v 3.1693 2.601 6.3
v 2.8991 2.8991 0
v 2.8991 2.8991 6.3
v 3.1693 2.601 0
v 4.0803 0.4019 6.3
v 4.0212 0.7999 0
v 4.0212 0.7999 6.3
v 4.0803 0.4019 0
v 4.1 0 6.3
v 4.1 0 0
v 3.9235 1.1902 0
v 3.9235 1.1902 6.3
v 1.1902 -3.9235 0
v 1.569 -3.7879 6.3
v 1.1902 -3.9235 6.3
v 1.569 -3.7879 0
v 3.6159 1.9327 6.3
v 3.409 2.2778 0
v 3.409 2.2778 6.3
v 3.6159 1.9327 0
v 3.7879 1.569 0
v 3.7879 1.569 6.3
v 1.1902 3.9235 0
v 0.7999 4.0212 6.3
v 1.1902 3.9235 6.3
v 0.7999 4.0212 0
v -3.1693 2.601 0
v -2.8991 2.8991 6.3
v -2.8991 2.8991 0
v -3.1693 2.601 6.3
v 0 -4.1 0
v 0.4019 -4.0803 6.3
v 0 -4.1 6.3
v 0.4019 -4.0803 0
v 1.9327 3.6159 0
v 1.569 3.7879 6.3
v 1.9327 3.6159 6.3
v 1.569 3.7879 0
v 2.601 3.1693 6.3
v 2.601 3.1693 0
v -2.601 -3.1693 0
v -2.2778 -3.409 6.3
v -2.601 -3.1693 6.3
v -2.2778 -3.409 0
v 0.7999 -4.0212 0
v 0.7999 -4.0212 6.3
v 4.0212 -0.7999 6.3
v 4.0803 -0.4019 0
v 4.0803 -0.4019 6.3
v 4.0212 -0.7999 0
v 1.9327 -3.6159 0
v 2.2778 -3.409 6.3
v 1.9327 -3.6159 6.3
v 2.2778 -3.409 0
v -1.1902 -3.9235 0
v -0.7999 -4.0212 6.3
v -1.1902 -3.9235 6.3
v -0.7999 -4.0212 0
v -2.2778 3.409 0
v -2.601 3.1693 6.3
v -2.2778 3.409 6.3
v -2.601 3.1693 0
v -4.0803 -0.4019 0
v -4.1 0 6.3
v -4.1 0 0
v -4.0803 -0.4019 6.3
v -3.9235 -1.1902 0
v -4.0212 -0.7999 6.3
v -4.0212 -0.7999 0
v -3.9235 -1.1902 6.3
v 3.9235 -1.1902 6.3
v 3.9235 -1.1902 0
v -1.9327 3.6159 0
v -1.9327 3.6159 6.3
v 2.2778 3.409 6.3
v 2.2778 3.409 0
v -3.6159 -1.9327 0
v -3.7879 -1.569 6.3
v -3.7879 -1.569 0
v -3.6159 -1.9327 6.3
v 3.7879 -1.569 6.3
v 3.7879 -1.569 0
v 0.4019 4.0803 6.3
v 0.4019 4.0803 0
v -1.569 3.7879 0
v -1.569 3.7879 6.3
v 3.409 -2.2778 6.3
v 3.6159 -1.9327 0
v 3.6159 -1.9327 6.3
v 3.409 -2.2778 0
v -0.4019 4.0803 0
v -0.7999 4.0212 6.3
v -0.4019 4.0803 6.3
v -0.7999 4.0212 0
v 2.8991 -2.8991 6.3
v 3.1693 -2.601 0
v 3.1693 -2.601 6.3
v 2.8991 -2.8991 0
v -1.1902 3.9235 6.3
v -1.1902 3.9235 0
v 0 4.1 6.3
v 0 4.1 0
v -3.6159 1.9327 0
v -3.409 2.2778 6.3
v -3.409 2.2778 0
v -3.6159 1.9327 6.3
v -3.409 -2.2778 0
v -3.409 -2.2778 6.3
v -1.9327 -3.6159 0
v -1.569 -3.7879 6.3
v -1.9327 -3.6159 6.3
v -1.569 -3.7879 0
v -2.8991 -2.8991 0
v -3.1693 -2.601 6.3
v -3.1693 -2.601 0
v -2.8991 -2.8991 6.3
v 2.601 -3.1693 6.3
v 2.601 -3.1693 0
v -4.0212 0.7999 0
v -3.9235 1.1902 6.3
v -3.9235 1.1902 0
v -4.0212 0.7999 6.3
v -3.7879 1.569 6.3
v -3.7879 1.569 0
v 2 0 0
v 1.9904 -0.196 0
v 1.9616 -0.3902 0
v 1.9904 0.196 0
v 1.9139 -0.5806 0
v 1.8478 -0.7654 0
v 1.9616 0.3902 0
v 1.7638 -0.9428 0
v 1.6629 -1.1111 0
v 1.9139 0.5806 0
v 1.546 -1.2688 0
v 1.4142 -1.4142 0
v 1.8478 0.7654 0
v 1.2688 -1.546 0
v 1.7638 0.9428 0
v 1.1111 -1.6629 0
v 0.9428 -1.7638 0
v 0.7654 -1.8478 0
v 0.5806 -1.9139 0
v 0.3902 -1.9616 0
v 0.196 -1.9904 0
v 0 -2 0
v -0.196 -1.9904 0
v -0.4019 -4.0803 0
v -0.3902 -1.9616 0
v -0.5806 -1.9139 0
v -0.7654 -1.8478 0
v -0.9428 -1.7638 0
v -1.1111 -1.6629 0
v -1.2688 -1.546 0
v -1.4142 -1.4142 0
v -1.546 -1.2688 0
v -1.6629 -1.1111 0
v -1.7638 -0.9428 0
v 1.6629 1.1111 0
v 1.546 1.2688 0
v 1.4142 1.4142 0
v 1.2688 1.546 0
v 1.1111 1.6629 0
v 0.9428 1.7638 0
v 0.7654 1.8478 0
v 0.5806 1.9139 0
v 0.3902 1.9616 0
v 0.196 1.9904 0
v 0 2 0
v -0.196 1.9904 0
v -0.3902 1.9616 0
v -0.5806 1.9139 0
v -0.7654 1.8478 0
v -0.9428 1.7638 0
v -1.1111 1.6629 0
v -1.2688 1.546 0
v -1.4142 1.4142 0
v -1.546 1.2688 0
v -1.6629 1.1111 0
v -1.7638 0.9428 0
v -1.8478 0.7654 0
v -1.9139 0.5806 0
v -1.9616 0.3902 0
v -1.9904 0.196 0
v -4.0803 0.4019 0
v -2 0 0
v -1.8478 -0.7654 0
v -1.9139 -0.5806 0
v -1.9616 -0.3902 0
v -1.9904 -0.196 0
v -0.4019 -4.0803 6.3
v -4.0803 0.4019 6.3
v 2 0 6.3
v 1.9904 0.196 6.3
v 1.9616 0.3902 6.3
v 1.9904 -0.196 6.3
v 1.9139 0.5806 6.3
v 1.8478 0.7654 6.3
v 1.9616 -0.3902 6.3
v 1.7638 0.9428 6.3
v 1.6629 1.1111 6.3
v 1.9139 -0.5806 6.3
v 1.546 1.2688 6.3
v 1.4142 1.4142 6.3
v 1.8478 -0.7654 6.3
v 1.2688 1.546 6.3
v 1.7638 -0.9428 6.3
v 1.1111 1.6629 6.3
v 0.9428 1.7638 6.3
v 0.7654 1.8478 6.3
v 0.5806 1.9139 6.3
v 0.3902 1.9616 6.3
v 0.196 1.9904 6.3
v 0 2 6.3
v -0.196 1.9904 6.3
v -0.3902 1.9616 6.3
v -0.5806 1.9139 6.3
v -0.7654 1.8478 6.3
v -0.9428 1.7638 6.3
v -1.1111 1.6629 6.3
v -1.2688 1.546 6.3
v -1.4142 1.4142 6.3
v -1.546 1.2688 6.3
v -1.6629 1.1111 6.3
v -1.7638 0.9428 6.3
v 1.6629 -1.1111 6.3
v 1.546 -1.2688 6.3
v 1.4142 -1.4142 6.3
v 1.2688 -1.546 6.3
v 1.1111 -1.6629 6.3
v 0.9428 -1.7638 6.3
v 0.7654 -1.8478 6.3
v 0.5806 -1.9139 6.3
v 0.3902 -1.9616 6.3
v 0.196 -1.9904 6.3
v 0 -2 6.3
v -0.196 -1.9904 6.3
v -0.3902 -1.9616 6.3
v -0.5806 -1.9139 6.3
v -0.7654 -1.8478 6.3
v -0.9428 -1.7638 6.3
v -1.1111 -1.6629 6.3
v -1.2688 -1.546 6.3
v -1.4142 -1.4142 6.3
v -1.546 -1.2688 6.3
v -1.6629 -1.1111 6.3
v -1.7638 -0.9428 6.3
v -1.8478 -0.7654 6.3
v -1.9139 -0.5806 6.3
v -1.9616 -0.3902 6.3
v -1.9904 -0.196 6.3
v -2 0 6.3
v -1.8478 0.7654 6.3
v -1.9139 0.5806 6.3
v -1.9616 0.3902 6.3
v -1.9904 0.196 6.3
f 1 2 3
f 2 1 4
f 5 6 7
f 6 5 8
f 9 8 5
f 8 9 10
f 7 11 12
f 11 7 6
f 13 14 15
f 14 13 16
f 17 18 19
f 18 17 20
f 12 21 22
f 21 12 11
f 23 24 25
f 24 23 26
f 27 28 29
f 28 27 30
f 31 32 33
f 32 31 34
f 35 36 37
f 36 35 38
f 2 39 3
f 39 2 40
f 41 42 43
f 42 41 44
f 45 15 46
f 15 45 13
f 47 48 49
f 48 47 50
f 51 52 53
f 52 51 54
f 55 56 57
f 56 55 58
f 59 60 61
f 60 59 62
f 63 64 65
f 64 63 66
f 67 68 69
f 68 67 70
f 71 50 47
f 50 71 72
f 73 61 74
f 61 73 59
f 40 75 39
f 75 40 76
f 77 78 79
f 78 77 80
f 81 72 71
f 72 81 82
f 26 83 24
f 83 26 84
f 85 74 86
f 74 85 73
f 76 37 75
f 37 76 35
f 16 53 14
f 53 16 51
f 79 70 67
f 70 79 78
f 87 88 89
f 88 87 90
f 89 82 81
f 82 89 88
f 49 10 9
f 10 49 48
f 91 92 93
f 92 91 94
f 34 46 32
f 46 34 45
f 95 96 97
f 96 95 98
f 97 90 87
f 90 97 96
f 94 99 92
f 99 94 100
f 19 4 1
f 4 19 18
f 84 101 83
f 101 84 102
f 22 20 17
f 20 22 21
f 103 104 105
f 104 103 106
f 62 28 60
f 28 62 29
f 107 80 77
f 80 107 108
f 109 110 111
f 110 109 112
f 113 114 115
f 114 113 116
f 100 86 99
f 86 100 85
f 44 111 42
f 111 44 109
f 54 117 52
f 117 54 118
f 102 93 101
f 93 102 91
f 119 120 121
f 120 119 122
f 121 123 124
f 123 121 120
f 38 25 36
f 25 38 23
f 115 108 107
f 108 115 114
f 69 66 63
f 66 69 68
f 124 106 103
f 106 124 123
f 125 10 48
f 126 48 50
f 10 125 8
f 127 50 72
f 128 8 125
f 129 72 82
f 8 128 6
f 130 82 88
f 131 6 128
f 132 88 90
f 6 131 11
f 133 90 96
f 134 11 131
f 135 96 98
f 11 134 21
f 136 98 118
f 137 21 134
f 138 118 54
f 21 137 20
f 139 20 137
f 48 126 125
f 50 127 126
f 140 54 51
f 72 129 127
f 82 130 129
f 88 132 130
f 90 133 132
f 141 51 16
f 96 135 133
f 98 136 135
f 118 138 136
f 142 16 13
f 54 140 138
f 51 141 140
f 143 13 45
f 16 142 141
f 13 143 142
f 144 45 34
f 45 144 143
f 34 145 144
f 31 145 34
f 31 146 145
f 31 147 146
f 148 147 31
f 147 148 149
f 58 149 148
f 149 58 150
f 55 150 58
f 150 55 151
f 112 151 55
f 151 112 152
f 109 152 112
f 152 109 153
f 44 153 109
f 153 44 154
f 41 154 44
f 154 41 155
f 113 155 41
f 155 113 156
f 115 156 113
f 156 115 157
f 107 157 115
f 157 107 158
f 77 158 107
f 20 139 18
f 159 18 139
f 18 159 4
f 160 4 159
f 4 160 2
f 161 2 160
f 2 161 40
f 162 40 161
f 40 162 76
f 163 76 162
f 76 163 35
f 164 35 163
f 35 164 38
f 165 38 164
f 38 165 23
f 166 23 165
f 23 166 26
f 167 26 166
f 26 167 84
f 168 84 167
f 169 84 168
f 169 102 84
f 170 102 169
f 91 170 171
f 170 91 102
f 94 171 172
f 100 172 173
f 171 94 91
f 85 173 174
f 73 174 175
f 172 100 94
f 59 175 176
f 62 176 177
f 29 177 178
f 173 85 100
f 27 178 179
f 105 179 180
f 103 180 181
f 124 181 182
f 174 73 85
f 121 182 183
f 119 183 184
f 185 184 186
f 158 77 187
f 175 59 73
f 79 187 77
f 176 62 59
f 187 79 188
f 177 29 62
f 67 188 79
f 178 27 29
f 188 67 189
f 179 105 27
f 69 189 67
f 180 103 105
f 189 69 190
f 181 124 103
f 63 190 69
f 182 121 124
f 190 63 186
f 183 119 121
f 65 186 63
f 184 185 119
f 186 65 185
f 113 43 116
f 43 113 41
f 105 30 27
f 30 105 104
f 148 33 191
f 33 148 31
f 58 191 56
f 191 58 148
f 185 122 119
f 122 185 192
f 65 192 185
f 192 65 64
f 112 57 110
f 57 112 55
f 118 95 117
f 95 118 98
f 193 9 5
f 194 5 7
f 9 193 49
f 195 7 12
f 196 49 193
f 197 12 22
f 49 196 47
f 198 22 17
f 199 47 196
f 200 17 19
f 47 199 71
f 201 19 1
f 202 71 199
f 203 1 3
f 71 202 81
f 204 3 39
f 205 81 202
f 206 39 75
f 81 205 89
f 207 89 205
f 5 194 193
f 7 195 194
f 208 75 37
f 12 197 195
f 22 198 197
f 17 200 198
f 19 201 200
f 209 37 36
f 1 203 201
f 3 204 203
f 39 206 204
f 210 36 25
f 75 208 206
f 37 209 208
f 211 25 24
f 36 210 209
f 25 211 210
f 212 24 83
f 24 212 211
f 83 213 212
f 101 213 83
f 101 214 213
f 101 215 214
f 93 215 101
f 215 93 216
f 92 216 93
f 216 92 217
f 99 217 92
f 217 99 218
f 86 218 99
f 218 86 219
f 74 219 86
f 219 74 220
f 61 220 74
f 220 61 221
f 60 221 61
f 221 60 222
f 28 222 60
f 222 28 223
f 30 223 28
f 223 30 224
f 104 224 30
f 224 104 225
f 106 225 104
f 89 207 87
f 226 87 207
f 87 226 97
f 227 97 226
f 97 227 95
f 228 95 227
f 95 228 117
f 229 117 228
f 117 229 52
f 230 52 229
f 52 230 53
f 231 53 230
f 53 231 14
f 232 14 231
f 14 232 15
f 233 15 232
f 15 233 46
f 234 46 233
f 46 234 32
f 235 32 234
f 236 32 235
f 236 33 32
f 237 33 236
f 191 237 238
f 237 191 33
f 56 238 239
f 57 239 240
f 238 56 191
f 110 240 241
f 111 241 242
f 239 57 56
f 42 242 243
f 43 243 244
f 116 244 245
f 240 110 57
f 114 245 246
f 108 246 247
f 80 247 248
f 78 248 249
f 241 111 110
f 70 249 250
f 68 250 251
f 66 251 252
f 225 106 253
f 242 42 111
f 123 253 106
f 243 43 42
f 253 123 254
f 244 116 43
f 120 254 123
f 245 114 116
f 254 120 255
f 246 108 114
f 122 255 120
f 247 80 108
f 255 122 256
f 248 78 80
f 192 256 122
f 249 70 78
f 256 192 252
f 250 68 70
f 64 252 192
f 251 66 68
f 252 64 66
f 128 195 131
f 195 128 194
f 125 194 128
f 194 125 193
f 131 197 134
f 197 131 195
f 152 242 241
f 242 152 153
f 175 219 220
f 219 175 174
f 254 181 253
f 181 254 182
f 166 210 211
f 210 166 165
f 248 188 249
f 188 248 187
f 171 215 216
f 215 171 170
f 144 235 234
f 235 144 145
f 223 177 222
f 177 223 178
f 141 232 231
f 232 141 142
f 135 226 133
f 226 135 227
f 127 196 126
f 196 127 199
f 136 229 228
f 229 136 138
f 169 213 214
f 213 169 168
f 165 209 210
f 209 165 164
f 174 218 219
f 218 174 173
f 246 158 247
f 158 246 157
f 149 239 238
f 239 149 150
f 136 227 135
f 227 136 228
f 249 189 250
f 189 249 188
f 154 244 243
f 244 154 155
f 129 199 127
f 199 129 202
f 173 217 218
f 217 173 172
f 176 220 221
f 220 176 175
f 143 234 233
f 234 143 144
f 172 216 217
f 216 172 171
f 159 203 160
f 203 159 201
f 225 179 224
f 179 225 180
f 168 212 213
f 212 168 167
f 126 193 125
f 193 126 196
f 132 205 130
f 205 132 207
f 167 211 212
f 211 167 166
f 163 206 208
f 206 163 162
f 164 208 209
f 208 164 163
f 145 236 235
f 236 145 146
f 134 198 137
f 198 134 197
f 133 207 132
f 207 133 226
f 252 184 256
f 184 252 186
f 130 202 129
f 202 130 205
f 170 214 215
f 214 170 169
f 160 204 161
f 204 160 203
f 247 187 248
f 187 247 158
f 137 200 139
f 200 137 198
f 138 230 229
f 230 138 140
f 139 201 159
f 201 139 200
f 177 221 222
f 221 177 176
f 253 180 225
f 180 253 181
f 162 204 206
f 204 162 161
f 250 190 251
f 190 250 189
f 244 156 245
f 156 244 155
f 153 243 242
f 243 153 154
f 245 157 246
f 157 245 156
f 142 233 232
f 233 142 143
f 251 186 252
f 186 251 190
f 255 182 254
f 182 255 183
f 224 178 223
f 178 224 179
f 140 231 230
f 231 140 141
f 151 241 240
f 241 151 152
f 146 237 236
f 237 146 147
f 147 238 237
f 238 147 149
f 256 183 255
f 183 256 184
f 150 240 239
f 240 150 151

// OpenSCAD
module threaded_insert() {
    difference() {
        cylinder(h=6.3, d=8.2, $fn=64);
        translate([0, 0, -1])
            cylinder(h=8.3, d=4.0, $fn=64);
    }
}

threaded_insert();
